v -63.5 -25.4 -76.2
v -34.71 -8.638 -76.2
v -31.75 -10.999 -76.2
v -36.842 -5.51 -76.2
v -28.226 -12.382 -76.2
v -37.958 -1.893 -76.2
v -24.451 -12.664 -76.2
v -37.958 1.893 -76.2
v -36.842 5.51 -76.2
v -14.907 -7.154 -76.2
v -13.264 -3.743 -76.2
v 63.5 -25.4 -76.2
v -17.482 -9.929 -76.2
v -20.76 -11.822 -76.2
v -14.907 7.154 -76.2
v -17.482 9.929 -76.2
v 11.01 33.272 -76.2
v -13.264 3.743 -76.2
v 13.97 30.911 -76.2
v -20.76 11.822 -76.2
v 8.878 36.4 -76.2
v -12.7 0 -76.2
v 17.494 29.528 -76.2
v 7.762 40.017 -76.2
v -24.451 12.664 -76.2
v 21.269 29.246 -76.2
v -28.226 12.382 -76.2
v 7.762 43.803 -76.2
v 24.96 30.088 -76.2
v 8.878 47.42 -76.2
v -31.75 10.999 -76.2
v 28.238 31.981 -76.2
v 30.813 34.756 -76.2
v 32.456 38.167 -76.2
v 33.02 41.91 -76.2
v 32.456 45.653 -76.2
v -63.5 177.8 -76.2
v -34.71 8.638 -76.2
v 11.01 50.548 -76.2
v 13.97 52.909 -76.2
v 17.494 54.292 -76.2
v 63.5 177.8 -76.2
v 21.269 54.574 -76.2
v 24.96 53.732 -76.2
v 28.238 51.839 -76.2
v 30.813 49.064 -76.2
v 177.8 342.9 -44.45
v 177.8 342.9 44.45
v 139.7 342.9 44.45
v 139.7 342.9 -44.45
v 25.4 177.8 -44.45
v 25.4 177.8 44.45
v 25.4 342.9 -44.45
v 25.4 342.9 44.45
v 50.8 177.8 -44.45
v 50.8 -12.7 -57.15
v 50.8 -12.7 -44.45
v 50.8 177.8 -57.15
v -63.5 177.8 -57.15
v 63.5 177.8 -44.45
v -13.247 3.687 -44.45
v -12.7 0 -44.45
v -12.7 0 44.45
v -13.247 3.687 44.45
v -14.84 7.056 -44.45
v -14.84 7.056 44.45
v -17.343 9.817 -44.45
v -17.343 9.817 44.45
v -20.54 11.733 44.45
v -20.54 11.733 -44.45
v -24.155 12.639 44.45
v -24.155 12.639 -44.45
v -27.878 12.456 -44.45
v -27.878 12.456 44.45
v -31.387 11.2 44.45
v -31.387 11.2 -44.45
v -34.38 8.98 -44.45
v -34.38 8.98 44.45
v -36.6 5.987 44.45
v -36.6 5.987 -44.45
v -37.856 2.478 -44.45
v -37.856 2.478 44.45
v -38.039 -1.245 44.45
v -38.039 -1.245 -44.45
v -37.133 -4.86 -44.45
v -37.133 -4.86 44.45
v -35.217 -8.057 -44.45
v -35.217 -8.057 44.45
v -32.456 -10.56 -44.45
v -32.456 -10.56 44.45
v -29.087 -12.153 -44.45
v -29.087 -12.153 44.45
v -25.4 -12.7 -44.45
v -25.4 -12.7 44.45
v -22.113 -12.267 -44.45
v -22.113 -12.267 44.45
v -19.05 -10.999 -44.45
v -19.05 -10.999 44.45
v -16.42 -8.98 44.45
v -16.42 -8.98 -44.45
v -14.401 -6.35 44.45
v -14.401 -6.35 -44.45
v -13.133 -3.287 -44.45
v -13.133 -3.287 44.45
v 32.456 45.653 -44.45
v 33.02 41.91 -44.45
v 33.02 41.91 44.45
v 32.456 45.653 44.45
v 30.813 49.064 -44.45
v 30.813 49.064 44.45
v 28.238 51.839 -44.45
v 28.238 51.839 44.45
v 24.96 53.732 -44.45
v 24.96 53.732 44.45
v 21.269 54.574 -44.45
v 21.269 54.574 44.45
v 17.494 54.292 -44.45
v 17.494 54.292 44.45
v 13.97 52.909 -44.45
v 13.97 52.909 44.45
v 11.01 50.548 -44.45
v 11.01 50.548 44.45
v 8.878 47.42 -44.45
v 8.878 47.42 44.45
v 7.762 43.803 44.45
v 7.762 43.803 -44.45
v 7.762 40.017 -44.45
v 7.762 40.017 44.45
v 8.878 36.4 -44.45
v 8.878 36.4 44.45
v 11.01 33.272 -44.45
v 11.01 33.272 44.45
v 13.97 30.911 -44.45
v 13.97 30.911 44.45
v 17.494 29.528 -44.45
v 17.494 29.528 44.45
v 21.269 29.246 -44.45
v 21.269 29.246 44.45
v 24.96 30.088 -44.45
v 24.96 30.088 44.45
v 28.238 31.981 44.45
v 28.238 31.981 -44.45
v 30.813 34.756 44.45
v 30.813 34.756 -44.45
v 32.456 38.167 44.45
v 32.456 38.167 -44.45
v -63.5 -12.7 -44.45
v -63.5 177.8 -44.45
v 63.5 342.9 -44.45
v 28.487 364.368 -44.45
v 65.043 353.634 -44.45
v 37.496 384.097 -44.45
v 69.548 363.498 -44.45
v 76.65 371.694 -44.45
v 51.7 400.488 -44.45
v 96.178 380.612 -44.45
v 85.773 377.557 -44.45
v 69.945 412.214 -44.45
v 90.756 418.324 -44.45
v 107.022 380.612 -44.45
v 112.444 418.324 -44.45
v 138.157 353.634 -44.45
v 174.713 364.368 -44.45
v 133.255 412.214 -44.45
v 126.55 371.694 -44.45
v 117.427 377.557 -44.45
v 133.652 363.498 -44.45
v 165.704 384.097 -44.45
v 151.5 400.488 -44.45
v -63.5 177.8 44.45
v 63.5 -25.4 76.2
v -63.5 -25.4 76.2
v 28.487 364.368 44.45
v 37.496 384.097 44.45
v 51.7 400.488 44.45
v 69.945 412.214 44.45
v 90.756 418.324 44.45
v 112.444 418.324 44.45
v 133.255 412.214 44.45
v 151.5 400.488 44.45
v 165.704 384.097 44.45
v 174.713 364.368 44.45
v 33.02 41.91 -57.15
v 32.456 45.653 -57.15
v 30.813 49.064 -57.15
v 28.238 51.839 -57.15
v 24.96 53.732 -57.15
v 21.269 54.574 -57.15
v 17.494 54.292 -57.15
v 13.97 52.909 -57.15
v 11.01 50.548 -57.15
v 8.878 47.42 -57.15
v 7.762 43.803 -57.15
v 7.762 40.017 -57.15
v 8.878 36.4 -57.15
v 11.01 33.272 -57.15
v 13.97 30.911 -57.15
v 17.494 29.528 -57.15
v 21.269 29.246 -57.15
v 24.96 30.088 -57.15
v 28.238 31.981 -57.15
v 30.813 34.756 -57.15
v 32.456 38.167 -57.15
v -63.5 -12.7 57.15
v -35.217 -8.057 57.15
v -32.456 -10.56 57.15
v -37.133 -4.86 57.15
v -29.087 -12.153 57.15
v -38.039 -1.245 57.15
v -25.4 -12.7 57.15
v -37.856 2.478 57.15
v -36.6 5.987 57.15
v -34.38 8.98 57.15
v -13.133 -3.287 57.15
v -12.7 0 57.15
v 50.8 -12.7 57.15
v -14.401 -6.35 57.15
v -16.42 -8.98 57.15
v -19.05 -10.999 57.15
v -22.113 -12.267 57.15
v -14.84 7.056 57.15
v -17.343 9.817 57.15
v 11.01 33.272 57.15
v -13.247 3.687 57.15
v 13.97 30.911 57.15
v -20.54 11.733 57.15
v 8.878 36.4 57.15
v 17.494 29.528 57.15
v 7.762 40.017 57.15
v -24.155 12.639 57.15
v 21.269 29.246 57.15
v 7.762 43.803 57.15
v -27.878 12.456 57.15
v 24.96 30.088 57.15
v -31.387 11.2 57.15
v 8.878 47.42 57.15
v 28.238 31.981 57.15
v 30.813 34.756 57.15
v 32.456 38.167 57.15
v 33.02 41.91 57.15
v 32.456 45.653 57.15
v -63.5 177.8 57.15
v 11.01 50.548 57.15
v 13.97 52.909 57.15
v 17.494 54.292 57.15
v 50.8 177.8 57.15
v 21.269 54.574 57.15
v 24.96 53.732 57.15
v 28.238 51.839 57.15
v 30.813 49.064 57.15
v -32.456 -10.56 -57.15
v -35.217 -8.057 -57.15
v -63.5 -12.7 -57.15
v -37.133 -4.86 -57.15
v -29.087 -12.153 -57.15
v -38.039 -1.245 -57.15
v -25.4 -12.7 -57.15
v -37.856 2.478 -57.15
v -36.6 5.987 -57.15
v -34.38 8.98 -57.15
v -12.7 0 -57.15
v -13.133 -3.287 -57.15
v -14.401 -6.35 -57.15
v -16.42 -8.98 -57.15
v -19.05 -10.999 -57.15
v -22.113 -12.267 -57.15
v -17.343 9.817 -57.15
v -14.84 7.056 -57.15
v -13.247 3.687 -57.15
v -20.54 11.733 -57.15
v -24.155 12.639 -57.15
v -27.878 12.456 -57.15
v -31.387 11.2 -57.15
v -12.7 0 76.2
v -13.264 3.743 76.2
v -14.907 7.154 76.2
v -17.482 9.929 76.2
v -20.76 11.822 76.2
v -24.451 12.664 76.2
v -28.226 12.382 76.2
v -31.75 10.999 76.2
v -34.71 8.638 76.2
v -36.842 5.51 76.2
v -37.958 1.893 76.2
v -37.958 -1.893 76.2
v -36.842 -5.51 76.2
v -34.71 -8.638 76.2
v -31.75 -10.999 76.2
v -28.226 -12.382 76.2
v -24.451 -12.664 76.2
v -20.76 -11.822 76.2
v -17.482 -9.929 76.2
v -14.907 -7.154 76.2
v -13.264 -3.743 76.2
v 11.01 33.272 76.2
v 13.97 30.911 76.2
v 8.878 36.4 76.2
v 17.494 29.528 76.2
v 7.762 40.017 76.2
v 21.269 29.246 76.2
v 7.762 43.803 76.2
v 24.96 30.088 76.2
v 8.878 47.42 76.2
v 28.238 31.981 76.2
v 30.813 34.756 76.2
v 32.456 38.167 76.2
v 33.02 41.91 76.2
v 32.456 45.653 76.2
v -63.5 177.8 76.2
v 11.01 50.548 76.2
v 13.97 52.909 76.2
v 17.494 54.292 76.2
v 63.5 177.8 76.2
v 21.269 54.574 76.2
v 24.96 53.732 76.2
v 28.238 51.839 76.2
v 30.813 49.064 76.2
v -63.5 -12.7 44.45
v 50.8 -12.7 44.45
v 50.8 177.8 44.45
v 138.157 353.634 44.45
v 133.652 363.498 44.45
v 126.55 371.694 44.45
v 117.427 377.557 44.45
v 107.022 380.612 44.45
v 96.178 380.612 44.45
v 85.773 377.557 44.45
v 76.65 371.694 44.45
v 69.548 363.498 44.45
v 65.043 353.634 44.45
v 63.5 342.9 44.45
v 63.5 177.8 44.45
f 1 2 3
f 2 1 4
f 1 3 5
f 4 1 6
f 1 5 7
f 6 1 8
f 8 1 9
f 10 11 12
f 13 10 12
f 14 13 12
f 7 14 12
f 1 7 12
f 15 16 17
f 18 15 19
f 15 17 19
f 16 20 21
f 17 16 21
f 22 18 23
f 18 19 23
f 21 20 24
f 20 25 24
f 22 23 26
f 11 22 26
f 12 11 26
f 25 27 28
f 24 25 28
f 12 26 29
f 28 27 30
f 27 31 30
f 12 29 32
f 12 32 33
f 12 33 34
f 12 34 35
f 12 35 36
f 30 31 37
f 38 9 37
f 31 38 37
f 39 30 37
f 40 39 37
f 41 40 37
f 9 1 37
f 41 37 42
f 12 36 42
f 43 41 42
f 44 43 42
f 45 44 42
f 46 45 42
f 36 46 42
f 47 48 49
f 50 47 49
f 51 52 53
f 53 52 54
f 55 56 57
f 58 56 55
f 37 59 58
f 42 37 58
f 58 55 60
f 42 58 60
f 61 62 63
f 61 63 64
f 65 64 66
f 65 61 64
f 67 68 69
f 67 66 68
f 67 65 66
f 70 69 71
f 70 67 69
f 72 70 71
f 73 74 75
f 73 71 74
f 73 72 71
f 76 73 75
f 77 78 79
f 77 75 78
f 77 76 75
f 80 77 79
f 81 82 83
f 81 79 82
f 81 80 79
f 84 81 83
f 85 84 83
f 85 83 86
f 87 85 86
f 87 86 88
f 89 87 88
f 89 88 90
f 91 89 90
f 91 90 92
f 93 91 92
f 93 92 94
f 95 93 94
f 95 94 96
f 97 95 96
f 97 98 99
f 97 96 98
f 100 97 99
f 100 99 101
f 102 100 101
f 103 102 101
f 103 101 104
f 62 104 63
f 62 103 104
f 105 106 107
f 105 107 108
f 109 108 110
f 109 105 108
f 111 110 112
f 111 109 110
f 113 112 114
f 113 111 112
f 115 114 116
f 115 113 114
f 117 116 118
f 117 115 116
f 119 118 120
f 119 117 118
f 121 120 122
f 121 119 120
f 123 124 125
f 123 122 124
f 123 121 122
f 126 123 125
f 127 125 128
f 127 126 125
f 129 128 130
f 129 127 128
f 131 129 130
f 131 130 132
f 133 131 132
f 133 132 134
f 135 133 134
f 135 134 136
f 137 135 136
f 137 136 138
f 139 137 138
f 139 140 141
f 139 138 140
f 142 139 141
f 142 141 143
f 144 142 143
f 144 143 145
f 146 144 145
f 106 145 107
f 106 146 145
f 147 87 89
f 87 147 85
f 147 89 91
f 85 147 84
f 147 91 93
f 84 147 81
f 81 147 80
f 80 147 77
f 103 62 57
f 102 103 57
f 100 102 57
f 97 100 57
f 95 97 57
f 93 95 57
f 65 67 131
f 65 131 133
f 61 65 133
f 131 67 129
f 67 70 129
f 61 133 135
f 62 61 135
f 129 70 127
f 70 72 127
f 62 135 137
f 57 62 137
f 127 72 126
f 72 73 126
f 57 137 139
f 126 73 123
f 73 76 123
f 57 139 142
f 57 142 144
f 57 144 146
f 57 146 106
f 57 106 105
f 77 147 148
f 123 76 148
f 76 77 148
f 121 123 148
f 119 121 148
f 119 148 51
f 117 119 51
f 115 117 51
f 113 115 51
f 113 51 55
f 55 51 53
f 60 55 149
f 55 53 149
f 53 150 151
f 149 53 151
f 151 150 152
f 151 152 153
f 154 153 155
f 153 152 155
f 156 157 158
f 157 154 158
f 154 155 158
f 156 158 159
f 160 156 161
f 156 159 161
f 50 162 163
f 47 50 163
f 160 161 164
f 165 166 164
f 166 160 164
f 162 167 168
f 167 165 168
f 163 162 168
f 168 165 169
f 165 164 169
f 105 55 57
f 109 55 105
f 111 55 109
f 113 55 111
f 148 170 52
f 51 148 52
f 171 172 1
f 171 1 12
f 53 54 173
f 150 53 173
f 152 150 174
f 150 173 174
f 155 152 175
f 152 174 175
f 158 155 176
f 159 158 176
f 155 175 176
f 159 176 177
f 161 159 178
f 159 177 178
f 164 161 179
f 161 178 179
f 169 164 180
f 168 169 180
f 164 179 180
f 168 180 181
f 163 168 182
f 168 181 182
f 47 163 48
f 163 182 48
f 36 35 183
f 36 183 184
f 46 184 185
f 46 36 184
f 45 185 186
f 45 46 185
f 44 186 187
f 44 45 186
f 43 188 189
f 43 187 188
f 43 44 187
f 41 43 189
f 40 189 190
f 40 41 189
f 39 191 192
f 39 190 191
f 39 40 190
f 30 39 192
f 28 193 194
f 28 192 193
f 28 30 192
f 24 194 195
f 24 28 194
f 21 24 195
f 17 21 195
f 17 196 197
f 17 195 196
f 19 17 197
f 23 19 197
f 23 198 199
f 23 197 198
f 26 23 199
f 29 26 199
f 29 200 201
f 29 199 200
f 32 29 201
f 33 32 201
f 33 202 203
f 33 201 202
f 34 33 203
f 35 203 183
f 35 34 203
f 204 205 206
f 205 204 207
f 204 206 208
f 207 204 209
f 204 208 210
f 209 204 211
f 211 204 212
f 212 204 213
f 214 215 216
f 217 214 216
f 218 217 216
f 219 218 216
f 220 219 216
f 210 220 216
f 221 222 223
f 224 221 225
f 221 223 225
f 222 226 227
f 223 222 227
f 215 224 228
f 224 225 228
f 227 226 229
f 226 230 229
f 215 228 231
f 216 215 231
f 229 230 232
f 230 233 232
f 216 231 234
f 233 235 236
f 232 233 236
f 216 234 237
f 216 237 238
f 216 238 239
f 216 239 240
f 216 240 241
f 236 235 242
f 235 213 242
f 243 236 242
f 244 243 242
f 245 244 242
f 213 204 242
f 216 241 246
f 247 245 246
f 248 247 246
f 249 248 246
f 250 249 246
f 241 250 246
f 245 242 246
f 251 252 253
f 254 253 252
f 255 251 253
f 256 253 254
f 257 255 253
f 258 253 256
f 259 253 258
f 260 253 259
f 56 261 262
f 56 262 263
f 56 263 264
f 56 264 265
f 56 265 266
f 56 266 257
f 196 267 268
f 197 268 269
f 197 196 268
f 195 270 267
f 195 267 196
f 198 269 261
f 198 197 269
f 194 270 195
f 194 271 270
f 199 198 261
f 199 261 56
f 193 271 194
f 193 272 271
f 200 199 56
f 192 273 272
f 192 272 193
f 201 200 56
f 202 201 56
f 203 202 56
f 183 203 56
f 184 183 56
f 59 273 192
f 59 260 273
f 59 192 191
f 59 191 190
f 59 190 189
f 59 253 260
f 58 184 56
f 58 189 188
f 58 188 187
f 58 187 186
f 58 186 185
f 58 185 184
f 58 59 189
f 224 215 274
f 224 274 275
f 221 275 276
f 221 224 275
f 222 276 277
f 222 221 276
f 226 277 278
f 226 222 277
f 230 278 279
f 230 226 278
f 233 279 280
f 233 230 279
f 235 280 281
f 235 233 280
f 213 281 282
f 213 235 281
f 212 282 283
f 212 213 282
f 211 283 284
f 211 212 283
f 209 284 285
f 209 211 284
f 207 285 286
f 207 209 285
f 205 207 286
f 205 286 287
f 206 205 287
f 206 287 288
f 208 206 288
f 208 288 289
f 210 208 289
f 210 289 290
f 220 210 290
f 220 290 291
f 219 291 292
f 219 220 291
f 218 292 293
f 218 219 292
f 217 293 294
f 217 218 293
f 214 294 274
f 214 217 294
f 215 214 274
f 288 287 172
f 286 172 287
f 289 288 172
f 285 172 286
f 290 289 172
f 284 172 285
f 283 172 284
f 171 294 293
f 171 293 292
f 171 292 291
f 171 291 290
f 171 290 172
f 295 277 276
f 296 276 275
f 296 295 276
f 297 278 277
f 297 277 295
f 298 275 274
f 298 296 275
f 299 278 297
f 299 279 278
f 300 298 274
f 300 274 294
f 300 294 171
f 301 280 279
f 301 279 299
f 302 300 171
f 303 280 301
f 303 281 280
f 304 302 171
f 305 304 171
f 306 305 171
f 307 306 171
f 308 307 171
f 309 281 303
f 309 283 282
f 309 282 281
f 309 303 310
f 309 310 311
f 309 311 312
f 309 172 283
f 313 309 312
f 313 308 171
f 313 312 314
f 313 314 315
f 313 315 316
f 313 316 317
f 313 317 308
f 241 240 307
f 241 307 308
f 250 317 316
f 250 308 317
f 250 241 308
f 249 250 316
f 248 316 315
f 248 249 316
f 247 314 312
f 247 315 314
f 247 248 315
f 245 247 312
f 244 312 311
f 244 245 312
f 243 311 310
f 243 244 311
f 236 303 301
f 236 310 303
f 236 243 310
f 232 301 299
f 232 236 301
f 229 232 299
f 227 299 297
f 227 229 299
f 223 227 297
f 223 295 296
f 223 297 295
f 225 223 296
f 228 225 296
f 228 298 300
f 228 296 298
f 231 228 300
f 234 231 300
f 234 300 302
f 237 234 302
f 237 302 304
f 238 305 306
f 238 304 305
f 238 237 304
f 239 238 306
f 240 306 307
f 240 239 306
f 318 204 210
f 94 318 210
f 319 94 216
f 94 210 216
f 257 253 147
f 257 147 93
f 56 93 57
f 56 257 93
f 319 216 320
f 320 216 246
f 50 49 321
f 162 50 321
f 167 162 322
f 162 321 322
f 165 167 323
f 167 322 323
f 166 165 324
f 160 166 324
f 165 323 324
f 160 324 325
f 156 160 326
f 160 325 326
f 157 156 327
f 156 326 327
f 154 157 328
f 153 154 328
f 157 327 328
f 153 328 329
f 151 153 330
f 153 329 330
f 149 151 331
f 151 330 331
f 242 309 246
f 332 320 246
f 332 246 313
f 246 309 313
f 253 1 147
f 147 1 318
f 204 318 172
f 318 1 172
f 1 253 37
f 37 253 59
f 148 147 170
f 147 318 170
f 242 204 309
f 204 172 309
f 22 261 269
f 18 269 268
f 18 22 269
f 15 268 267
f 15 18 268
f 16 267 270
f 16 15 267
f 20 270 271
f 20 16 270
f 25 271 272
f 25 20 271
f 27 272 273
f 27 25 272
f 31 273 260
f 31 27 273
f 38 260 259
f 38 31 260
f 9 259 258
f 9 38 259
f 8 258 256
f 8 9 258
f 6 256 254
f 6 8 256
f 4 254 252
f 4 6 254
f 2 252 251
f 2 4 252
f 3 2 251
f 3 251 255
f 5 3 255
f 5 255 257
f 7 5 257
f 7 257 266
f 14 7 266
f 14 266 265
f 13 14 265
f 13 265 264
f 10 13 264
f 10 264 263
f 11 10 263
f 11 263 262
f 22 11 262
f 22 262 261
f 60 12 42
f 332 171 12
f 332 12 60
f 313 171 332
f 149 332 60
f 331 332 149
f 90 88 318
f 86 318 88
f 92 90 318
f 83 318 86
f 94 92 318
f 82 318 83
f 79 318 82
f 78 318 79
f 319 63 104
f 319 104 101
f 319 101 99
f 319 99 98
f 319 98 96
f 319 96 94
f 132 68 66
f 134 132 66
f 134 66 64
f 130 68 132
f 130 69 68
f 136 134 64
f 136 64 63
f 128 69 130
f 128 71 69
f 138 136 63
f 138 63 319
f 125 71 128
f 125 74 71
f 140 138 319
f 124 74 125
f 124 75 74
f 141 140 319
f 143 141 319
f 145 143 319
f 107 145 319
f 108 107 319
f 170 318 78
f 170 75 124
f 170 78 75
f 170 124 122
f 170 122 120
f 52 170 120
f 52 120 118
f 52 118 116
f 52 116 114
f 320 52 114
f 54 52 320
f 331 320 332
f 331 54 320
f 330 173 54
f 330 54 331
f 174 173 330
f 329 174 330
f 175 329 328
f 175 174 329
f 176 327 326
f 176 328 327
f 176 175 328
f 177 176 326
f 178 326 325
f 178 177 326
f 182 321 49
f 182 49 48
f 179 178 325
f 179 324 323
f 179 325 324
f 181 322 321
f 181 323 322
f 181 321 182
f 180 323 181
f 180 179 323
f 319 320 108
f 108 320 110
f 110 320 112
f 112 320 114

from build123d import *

# Parameters (mm, degrees)
SKETCH1_W               = 0.254
SKETCH1_H               = 25.4
SKETCH1_W_2             = 25.4
SKETCH1_H_2             = 152.4
BOSS_EXTRUDE1_DEPTH     = 76.2
SKETCH5_W               = 38.1
SKETCH5_H               = 368.3
BOSS_EXTRUDE2_DEPTH     = 44.45
SKETCH6_W               = 127
SKETCH6_H               = 203.2
BOSS_EXTRUDE3_DEPTH     = 76.2
CUT_EXTRUDE1_DEPTH      = 462.588658873
CUT_EXTRUDE1_DEPTH_BACK = 462.588658873
SKETCH7_R               = 12.7
SKETCH8_W               = 114.3
SKETCH8_H               = 190.5
CUT_EXTRUDE2_DEPTH      = 6.35


with BuildPart() as part:
    # Sketch1 → Boss-Extrude1 (new, symmetric)
    with BuildSketch(Plane.XY):
        with Locations((-25.527, 12.7)):
            Rectangle(SKETCH1_W, SKETCH1_H)
        with Locations((-12.7, 76.2)):
            Rectangle(SKETCH1_W_2, SKETCH1_H_2)
        Polygon((0, 152.4), (0, 0), (-25.4, 0), (-25.4, -25.4), (25.4, -25.4), (25.4, 177.8), (-25.4, 177.8), (-25.4, 152.4), align=None)
    extrude(amount=BOSS_EXTRUDE1_DEPTH, both=True)

    # Sketch5 → Boss-Extrude2 (add, symmetric)
    with BuildSketch(Plane.XY):
        with BuildLine():
            ThreePointArc((139.7, 342.9), (101.6, 381), (63.5, 342.9))
            Line((63.5, 342.9), (25.4, 342.9))
            ThreePointArc((25.4, 342.9), (101.6, 419.1), (177.8, 342.9))
            Line((177.8, 342.9), (139.7, 342.9))
        make_face()
        with Locations((44.45, 158.75)):
            Rectangle(SKETCH5_W, SKETCH5_H)
    extrude(amount=BOSS_EXTRUDE2_DEPTH, both=True)

    # Sketch6 → Boss-Extrude3 (add, symmetric)
    with BuildSketch(Plane.XY):
        with Locations((0, 76.2)):
            Rectangle(SKETCH6_W, SKETCH6_H)
    extrude(amount=BOSS_EXTRUDE3_DEPTH, both=True)

    # Sketch7 → Cut-Extrude1 (cut, two sides: drawn at the far end of the back side and taken through both)
    with BuildSketch(Plane.XY.offset(-CUT_EXTRUDE1_DEPTH_BACK)):
        with Locations((-25.4, 0)):
            Circle(SKETCH7_R)
        with Locations((20.32, 41.91)):
            Circle(SKETCH7_R)
    extrude(amount=CUT_EXTRUDE1_DEPTH + CUT_EXTRUDE1_DEPTH_BACK, mode=Mode.SUBTRACT)

    # Sketch8 → Cut-Extrude2 (cut, symmetric)
    with BuildSketch(Plane.XY.offset(50.8)):
        with Locations((-6.35, 82.55)):
            Rectangle(SKETCH8_W, SKETCH8_H)
    cut_extrude2 = extrude(amount=CUT_EXTRUDE2_DEPTH, both=True, mode=Mode.SUBTRACT)

    # Mirror1: Cut-Extrude2 across plane
    add(cut_extrude2.mirror(Plane.XY), mode=Mode.SUBTRACT)


solid = part.part
